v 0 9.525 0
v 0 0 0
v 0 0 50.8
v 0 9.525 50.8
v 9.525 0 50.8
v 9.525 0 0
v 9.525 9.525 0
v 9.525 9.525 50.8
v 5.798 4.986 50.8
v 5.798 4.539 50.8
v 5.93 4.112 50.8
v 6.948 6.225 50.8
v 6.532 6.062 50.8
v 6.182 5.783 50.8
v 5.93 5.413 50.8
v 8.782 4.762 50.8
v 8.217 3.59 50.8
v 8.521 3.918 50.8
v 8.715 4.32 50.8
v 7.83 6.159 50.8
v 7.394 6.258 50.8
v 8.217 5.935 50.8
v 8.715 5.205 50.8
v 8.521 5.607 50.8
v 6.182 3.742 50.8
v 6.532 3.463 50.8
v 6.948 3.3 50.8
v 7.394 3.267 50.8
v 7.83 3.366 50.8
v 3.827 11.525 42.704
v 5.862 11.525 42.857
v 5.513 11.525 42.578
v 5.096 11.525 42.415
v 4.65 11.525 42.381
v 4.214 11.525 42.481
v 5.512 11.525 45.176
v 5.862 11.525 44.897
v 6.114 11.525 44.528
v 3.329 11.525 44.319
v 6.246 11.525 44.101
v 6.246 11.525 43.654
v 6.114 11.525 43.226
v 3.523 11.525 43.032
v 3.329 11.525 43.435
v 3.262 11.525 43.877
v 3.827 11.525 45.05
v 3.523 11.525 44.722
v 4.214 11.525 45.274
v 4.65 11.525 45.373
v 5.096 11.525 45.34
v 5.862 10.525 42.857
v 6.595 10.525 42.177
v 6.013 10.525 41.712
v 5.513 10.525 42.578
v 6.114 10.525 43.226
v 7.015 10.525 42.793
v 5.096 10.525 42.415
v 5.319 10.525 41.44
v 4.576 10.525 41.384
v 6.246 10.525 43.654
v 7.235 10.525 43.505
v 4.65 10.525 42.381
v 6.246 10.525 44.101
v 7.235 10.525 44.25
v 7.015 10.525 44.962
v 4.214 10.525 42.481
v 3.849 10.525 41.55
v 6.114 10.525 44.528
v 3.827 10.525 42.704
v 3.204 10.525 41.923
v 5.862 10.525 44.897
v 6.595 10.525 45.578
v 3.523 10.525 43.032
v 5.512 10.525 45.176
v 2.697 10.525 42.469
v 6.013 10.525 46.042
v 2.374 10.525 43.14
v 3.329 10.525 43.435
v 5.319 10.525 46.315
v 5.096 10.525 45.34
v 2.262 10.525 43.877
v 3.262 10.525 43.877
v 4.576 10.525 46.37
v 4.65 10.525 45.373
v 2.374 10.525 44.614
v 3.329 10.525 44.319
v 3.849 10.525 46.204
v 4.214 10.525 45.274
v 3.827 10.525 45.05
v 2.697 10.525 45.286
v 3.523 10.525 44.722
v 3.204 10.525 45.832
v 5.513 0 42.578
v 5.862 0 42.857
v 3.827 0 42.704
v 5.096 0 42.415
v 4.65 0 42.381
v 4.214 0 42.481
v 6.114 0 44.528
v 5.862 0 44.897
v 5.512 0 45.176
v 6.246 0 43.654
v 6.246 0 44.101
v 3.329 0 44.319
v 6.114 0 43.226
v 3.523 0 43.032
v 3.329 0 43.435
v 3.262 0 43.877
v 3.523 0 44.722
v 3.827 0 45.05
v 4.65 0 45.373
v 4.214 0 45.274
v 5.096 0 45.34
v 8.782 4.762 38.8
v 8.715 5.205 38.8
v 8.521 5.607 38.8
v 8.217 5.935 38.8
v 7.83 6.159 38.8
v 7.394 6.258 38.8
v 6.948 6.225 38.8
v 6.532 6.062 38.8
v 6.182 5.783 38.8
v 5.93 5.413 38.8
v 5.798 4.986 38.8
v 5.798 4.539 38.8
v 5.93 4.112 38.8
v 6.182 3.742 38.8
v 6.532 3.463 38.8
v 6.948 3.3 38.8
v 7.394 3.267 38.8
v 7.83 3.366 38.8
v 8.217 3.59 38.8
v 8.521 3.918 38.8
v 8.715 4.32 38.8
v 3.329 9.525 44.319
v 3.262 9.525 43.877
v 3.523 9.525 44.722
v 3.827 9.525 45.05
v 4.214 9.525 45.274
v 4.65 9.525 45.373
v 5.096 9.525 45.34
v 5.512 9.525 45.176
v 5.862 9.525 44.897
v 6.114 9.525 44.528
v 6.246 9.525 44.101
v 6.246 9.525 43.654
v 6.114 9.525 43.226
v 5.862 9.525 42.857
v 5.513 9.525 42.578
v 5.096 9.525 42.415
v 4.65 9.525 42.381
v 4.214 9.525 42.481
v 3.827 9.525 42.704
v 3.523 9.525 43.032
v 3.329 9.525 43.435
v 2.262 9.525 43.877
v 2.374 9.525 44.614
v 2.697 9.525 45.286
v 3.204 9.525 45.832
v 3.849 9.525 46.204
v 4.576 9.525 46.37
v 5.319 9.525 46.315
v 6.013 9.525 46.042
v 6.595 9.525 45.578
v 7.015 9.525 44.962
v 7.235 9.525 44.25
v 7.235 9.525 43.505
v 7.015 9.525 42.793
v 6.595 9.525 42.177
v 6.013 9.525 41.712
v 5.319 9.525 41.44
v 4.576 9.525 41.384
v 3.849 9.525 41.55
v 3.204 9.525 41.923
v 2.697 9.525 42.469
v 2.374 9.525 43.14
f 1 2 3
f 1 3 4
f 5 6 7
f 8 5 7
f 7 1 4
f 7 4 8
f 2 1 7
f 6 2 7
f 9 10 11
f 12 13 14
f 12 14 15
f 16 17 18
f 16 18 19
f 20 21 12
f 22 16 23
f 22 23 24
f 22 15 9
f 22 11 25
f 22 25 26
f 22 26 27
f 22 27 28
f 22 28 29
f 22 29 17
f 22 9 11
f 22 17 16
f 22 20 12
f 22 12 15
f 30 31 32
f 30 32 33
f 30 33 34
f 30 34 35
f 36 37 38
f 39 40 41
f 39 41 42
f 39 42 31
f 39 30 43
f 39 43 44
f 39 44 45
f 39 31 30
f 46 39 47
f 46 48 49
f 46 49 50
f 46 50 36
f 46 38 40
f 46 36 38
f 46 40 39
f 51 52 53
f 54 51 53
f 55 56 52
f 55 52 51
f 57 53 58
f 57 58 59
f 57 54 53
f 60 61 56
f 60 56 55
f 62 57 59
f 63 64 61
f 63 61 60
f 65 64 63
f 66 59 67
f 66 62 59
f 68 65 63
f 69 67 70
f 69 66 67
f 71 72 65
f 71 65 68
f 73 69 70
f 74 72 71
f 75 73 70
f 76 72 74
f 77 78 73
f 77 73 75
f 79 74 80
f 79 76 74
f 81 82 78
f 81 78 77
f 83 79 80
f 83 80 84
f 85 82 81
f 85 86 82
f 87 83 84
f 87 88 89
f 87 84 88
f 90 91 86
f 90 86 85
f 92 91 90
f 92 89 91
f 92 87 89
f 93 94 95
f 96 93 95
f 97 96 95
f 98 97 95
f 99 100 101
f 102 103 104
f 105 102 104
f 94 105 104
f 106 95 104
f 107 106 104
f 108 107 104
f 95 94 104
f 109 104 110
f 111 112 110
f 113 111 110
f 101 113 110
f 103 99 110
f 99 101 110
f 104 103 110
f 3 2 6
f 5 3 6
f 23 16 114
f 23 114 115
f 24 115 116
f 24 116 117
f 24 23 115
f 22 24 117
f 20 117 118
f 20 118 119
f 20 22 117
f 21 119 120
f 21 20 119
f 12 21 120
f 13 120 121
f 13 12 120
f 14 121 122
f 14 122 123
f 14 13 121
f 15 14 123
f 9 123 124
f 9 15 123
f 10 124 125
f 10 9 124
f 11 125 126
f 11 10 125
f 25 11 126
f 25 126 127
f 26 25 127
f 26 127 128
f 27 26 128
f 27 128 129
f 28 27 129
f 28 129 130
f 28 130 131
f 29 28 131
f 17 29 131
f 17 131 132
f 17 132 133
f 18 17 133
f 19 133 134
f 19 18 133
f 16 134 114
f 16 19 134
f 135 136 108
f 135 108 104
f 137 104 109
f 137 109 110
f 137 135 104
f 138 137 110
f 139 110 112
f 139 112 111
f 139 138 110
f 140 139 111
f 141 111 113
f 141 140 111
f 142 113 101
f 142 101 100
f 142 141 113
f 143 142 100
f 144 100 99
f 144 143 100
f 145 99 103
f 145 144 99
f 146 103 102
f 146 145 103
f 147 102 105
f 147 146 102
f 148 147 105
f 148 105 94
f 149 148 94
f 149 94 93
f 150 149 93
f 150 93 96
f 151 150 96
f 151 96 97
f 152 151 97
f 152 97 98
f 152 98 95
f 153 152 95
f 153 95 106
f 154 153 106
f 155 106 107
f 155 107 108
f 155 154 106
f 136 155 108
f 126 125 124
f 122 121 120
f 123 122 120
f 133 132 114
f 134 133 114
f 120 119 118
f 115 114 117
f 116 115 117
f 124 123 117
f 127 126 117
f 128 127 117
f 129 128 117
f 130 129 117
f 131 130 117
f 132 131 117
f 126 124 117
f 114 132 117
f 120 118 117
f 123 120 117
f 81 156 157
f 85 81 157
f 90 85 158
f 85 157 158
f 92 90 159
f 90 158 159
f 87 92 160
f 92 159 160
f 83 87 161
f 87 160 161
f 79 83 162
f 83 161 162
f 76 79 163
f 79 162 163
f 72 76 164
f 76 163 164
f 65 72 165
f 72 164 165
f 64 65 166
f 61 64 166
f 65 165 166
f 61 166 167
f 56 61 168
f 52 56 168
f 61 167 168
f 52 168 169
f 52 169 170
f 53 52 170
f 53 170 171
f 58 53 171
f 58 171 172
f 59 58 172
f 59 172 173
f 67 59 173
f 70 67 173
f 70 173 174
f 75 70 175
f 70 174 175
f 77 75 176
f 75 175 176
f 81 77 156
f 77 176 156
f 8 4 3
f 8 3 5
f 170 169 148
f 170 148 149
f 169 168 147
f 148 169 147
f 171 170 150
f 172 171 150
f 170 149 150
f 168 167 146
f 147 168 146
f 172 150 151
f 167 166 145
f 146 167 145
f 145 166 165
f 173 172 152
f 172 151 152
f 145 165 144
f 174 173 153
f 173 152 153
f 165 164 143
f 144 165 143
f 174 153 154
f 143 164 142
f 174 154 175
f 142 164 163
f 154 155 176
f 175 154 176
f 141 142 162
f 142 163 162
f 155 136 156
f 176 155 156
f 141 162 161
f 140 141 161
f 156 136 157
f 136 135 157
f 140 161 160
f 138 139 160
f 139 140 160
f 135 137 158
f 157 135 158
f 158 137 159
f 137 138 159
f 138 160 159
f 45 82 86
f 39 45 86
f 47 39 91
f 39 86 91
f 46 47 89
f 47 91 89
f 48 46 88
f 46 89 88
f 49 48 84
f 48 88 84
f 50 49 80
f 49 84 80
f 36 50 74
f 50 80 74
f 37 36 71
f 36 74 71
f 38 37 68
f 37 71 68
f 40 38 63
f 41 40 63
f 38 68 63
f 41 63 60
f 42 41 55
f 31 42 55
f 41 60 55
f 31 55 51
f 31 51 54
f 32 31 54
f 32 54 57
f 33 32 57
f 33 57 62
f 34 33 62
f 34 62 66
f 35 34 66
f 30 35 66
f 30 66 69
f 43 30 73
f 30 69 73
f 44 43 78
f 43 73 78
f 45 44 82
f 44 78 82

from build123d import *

# Parameters (mm, degrees)
F0_W     = 9.525
F0_H     = 9.525
F1_DEPTH = 50.8
F2_R     = 1.5
F3_DEPTH = 9.525
F4_R     = 2.5
F5_DEPTH = 1
F6_R     = 1.5
F7_DEPTH = 1
F8_R     = 1.5
F9_DEPTH = 12


with BuildPart() as f1:
    # F0 (on Top) → F1 (new body)
    with BuildSketch(Plane.XY):
        with Locations((4.7625, 4.7625)):
            Rectangle(F0_W, F0_H)
    extrude(amount=F1_DEPTH)


with BuildPart() as f3:
    # F2 (on face) → F3 (new body, through all)
    with BuildSketch(Plane(origin=(0, 9.525, 0), x_dir=(-1, 0, 0), z_dir=(0, 1, 0))):
        with Locations((-4.7625, 43.8772141933)):
            Circle(F2_R)
    extrude(amount=-F3_DEPTH)

    # F4 (on face) → F5 (join)
    with BuildSketch(Plane(origin=(0, 9.525, 0), x_dir=(-1, 0, 0), z_dir=(0, 1, 0))):
        with Locations((-4.7625, 43.8772141933)):
            Circle(F4_R)
    extrude(amount=F5_DEPTH)

    # F6 (on face) → F7 (join)
    with BuildSketch(Plane(origin=(0, 10.525, 0), x_dir=(-1, 0, 0), z_dir=(0, 1, 0))):
        with Locations((-4.7625, 43.8772141933)):
            Circle(F6_R)
    extrude(amount=F7_DEPTH)


with BuildPart() as f9:
    # F8 (on face) → F9 (new body)
    with BuildSketch(Plane.XY.offset(50.8)):
        with Locations((7.2815776813, 4.7625)):
            Circle(F8_R)
    extrude(amount=-F9_DEPTH)


solid = Compound([f1.part, f3.part, f9.part])
